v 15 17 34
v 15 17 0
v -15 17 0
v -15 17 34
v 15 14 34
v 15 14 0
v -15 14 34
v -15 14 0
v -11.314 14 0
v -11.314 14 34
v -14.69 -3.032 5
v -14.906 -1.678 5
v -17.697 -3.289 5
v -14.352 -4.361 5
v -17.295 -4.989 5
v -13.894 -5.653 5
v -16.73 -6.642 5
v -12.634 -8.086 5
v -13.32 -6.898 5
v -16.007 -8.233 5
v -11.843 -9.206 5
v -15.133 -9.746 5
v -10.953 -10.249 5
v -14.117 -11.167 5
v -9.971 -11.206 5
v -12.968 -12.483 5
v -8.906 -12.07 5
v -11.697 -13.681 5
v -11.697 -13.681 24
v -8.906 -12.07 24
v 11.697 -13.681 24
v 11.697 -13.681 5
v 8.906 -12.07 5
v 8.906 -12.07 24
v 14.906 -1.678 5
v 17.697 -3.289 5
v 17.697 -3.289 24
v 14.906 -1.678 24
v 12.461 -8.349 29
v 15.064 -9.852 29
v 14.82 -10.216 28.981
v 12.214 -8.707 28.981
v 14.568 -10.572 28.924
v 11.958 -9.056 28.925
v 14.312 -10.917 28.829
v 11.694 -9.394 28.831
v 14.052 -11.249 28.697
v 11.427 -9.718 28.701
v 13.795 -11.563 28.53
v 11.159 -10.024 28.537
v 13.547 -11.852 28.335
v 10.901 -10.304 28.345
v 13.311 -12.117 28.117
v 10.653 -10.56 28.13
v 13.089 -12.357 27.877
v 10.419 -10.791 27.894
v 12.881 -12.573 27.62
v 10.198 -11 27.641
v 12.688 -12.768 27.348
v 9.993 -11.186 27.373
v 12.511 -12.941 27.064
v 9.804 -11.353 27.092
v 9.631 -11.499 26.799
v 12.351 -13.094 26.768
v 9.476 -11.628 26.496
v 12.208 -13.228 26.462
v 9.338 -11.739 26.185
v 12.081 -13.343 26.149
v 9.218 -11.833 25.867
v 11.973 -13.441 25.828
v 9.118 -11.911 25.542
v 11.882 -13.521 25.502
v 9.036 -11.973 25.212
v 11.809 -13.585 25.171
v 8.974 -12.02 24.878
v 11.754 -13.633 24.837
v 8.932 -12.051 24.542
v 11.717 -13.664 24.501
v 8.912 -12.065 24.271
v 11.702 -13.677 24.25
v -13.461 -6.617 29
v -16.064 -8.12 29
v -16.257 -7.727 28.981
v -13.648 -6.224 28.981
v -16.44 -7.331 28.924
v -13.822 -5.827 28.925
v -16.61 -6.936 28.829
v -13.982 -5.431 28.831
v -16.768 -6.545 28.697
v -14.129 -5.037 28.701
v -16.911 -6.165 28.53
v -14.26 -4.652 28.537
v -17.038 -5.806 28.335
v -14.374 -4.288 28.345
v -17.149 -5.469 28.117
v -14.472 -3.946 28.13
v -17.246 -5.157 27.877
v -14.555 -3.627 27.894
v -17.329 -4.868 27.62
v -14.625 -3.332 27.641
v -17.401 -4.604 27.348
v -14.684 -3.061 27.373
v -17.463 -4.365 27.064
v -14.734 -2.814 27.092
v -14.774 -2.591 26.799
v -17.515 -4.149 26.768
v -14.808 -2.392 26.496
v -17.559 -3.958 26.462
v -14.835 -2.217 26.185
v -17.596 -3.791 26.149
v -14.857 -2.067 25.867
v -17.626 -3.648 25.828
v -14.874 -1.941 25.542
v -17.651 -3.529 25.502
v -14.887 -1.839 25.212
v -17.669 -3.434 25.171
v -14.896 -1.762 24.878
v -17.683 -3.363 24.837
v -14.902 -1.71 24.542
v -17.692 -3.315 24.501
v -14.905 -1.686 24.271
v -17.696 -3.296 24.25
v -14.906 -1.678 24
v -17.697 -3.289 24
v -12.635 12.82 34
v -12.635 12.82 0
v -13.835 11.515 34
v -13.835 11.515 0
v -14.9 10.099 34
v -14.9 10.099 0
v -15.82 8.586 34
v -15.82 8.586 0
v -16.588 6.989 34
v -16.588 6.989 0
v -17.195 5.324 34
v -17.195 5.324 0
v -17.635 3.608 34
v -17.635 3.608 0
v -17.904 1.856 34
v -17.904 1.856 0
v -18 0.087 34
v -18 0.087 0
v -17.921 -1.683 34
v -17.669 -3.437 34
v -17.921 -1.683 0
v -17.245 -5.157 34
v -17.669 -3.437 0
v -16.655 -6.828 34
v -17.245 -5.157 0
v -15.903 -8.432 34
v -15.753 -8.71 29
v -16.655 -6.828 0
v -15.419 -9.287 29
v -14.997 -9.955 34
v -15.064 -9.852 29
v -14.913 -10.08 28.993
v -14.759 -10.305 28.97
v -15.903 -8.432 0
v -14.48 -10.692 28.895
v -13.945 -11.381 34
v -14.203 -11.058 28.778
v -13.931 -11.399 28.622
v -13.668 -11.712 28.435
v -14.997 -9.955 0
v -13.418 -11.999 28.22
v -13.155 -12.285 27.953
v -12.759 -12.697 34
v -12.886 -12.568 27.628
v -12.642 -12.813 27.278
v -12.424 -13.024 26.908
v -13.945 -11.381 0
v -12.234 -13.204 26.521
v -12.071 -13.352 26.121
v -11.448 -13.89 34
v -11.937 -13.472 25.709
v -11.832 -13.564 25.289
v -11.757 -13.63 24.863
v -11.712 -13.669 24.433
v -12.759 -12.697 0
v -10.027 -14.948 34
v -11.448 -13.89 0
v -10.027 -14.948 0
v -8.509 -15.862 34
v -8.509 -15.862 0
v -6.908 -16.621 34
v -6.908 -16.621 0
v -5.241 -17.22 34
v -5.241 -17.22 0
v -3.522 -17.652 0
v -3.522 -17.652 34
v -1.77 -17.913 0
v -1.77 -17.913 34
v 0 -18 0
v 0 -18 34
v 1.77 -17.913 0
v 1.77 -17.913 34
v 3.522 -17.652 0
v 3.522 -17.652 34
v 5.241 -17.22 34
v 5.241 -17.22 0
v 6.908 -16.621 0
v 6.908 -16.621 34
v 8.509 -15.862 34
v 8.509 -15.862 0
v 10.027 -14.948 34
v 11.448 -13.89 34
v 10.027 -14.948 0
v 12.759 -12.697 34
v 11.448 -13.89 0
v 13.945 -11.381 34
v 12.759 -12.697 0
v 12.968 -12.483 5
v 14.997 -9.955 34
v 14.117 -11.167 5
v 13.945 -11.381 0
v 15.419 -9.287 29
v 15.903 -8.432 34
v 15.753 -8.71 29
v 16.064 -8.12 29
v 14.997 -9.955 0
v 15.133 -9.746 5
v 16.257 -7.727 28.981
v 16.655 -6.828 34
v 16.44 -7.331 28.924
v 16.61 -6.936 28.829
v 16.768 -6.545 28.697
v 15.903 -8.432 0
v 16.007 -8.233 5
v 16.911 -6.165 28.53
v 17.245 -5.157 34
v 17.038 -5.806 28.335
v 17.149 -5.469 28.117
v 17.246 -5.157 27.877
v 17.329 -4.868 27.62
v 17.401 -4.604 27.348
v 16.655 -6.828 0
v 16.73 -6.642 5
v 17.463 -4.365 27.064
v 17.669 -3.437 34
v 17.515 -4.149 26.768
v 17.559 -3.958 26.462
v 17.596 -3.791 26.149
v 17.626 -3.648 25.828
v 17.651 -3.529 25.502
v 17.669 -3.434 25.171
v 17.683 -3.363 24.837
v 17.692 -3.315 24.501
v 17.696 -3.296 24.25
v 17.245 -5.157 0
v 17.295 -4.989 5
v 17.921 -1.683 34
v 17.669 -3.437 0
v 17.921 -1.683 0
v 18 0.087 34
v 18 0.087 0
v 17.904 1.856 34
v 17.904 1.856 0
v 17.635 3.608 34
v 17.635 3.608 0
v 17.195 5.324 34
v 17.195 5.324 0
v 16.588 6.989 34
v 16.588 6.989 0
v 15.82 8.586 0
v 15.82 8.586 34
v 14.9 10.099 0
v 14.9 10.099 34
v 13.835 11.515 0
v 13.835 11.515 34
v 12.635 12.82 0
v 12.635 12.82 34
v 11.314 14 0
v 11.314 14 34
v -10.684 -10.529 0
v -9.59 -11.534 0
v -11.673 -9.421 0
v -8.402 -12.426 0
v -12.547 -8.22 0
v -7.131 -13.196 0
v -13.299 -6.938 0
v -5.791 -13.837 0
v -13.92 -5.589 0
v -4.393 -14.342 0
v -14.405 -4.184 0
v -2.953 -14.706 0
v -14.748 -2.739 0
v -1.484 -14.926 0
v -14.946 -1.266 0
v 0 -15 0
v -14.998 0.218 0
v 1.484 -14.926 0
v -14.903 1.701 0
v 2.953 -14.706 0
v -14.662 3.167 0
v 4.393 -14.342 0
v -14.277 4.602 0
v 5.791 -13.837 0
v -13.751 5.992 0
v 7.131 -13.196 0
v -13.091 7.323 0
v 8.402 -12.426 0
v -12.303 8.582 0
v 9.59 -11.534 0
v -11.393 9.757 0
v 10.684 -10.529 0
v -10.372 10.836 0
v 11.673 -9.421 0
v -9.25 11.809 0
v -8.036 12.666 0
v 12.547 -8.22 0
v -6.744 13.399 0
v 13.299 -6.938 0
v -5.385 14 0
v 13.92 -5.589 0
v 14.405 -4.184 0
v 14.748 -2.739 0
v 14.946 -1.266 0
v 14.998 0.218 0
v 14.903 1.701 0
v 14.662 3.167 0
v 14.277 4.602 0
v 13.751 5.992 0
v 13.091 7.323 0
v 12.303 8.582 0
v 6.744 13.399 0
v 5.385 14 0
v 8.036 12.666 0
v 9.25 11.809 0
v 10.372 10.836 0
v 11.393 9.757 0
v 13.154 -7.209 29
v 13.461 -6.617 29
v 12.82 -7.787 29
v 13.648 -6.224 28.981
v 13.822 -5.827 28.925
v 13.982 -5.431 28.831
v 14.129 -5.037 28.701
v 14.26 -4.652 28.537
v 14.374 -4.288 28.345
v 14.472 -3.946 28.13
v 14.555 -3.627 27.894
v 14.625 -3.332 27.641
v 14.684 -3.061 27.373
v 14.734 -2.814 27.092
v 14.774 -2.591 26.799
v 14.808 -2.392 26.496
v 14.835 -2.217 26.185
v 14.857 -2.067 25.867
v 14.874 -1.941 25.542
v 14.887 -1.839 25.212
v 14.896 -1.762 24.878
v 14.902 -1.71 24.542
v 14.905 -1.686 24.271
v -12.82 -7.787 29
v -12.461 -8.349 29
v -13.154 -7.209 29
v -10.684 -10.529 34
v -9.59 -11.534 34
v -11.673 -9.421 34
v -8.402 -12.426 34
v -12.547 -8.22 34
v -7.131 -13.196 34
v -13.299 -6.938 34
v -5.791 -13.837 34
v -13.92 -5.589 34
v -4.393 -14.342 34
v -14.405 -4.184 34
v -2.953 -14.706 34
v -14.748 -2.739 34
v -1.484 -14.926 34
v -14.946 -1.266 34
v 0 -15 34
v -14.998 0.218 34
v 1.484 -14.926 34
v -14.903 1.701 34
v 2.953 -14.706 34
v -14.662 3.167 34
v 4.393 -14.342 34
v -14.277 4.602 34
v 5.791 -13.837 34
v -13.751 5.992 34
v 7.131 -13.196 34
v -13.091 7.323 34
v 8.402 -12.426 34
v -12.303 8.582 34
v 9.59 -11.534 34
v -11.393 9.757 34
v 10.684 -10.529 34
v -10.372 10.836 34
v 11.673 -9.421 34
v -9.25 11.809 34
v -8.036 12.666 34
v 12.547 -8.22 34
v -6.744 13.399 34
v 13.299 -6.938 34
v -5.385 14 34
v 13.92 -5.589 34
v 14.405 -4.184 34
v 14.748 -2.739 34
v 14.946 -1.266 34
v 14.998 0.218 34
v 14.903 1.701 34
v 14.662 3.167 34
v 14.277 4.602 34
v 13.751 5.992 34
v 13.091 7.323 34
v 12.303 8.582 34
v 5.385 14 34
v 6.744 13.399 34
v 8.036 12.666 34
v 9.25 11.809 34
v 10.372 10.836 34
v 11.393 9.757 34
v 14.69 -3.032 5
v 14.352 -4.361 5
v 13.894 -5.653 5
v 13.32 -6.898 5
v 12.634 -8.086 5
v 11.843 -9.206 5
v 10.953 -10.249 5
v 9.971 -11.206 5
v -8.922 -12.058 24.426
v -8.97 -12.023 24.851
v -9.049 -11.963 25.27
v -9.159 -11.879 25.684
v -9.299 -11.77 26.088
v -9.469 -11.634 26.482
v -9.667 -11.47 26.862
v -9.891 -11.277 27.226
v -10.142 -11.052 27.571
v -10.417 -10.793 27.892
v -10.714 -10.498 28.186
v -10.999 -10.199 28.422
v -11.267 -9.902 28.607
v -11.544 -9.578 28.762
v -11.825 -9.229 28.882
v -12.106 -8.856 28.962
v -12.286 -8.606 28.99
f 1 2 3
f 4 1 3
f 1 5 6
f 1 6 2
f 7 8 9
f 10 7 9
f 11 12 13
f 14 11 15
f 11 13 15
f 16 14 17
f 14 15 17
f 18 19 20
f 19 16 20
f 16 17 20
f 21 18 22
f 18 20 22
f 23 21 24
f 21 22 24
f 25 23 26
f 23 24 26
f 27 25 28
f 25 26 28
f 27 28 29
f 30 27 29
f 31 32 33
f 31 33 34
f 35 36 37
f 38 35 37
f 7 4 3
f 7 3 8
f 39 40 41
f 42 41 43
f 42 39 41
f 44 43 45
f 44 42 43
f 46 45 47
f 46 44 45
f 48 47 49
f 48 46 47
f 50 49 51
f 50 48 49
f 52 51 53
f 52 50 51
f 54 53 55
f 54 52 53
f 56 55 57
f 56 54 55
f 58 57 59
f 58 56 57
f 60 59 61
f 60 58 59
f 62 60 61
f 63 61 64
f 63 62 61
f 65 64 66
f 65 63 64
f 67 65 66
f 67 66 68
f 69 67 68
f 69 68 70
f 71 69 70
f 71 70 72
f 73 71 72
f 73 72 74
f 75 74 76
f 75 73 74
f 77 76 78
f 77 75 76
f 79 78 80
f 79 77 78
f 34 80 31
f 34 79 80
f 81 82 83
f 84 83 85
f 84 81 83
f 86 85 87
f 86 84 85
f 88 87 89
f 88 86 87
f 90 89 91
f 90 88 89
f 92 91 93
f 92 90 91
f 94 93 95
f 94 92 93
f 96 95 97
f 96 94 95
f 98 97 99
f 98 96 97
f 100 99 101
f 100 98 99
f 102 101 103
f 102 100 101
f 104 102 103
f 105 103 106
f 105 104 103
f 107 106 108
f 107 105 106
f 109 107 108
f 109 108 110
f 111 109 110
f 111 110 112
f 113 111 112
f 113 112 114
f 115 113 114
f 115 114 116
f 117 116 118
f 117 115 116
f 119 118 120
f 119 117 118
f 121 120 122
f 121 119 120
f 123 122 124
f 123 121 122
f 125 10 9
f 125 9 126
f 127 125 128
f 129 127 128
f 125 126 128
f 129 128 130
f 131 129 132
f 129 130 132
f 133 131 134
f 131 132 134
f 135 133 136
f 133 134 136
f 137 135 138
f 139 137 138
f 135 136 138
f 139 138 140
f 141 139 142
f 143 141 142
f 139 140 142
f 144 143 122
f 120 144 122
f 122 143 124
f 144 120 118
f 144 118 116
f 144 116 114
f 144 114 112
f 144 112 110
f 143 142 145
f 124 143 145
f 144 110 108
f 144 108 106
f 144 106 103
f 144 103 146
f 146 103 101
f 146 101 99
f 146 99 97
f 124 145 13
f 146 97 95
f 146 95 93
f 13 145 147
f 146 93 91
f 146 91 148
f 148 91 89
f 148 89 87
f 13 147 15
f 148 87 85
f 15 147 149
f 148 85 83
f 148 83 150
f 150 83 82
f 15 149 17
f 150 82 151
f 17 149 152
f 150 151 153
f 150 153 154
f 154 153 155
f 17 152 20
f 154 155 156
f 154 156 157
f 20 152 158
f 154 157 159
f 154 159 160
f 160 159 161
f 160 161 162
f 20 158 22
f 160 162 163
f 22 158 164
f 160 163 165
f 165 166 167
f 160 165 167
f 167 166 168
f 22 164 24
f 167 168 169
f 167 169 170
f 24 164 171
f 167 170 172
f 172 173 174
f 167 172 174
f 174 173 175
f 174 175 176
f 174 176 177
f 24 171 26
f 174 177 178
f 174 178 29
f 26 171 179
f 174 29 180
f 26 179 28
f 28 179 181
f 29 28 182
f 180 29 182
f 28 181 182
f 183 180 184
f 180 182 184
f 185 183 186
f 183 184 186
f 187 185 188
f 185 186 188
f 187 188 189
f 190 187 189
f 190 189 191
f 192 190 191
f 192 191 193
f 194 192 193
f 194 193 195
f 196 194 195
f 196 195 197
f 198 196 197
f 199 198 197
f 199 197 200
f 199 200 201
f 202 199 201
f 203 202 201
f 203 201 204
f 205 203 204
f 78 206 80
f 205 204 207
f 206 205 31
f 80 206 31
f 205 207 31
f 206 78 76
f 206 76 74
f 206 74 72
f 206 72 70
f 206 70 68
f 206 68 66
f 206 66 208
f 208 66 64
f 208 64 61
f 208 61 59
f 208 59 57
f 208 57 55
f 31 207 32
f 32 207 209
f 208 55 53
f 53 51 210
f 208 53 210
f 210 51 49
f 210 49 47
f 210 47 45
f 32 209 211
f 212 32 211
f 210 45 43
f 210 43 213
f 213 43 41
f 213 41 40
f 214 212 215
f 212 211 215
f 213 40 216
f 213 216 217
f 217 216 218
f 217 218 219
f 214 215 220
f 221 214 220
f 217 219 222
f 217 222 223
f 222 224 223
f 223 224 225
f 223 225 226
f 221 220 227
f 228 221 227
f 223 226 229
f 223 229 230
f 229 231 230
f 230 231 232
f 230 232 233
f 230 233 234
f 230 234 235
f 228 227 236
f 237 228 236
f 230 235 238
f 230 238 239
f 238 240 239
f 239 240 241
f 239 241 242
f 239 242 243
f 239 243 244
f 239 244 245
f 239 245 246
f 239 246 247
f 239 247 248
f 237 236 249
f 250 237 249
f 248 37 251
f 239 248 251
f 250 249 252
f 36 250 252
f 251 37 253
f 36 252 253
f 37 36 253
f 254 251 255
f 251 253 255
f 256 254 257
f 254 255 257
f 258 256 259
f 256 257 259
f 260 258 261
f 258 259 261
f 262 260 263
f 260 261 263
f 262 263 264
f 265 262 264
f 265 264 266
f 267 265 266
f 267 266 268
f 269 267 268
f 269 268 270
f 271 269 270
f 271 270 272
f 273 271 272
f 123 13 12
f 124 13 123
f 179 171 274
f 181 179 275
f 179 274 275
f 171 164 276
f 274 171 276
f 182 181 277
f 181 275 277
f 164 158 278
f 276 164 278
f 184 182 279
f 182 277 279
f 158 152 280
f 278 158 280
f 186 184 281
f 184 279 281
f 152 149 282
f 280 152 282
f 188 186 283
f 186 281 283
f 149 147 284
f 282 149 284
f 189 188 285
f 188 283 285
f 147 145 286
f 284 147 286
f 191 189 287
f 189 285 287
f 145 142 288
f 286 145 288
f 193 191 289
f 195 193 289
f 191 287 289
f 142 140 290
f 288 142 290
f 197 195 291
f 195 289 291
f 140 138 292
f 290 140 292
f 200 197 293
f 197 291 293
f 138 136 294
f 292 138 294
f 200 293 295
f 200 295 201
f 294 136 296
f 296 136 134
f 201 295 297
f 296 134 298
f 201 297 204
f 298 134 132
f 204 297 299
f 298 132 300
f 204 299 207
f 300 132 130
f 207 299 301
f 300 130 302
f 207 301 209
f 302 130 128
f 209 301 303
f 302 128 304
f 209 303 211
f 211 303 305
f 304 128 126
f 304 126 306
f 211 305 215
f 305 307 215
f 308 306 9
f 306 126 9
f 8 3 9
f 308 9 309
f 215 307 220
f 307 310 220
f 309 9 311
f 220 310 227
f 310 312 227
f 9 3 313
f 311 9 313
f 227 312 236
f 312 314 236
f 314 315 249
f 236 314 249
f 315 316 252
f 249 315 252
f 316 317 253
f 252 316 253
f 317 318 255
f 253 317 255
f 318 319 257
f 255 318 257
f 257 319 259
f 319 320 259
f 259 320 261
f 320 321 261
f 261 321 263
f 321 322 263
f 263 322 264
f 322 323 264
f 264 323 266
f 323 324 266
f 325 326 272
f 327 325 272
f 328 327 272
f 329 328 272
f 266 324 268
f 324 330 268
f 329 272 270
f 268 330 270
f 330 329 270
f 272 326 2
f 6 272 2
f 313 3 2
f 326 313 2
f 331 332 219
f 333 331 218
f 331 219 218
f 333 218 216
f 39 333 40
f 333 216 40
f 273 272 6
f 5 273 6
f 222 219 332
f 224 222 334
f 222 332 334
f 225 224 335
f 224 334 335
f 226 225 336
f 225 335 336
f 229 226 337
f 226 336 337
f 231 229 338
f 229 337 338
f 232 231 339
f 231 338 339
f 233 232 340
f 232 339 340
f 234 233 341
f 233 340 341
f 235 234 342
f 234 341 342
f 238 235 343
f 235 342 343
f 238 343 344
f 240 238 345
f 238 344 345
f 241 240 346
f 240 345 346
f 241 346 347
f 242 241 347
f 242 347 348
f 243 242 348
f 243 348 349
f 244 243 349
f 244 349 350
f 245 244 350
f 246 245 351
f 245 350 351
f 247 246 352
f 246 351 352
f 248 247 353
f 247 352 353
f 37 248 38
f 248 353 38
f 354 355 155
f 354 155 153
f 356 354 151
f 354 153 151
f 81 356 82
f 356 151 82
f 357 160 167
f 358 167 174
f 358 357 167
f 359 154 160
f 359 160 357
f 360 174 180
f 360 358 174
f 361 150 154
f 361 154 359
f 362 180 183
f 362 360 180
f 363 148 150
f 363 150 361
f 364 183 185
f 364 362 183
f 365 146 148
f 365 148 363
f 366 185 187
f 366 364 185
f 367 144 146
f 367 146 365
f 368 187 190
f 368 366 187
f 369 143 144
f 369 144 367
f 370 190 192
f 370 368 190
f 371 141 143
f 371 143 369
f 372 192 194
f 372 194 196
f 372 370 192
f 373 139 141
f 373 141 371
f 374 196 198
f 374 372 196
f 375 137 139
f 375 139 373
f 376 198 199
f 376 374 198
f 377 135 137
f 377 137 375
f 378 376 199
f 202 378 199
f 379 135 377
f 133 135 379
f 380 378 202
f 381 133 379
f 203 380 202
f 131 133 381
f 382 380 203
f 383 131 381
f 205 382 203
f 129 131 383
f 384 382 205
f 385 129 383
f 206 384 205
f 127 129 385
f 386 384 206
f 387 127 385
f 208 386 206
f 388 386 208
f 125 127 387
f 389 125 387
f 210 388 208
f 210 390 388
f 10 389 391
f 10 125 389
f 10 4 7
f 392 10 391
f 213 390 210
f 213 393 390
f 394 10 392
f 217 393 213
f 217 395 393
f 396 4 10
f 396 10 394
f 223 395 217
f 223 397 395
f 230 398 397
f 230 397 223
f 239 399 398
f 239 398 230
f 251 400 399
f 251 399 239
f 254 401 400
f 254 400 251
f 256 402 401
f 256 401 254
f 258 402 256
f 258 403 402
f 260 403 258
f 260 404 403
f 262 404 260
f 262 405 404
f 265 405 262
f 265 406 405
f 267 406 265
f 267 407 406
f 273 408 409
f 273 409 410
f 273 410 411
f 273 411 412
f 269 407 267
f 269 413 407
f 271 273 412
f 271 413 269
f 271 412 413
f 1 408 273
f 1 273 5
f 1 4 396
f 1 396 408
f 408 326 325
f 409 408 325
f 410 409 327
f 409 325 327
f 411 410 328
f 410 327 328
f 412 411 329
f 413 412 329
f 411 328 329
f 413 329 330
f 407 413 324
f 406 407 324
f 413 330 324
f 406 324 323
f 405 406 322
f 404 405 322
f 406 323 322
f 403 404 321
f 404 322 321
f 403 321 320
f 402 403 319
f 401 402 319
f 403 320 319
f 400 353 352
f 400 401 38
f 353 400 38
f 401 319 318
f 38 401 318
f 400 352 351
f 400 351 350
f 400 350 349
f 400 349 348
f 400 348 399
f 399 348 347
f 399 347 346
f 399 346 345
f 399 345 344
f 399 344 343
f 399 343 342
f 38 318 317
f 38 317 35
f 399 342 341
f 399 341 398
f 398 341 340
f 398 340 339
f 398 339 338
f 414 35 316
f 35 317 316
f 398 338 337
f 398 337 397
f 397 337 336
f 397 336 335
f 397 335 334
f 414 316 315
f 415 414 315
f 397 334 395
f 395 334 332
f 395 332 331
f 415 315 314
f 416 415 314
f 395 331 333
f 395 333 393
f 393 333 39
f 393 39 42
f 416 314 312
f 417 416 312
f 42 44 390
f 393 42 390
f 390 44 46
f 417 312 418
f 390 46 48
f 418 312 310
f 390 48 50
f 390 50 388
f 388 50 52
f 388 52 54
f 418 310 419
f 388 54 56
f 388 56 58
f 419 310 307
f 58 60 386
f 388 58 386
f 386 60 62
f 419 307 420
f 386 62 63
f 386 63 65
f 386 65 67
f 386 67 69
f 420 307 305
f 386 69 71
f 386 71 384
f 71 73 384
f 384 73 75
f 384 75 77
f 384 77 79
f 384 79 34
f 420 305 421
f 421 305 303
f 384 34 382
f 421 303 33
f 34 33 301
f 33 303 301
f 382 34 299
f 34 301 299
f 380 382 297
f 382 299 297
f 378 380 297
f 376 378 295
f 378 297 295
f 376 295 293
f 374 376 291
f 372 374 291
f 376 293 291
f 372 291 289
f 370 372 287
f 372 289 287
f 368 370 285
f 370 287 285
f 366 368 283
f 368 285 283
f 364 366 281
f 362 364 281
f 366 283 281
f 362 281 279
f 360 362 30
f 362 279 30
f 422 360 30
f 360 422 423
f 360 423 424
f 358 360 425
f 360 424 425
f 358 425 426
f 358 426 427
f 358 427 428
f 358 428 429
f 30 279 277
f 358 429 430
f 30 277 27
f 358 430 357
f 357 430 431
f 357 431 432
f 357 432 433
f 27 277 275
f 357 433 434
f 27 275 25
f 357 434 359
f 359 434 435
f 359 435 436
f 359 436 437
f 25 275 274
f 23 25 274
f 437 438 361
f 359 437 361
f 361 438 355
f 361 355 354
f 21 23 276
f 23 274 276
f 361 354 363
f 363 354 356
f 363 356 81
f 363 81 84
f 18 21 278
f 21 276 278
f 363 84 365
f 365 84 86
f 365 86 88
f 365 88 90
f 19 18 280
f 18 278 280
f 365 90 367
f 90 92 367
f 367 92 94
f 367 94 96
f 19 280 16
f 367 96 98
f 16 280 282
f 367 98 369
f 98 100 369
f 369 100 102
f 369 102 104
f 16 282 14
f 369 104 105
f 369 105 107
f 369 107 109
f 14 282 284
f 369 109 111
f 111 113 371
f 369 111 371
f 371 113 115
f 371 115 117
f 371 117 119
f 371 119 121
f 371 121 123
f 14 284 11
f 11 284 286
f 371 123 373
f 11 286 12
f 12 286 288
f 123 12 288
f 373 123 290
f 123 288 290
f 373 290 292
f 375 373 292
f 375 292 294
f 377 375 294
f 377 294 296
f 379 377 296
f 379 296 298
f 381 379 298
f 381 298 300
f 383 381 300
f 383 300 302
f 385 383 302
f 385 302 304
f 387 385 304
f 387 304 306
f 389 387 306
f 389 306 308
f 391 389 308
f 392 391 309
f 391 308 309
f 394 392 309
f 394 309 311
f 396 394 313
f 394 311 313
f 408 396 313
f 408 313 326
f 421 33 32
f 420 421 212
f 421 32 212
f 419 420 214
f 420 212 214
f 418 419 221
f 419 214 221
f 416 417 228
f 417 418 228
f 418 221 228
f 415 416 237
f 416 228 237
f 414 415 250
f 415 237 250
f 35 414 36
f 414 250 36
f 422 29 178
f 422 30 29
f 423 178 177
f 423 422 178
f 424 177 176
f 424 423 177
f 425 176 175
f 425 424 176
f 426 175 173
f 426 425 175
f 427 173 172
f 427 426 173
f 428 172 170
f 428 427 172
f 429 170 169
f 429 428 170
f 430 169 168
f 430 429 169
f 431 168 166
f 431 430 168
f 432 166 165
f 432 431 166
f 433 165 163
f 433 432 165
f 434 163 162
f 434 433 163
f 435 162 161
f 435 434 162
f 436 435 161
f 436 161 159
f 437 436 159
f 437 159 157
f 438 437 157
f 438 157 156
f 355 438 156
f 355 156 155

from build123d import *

# Parameters (mm, degrees)
F1_DEPTH  = 34
F9_W      = 6
F9_H      = 24
F10_DEPTH = 10
F11_W     = 6
F11_H     = 24
F12_DEPTH = 10
F13_R     = 5


with BuildPart() as f1:
    # F0 (on Top) → F1 (new body)
    with BuildSketch(Plane.XY):
        with BuildLine():
            Line((-15, 14), (-11.313708, 14))
            ThreePointArc((-11.313708, 14), (0, -18), (11.313708, 14))
            Line((11.313708, 14), (15, 14))
            Line((15, 14), (15, 17))
            Line((15, 17), (-15, 17))
            Line((-15, 17), (-15, 14))
        make_face()
        with BuildLine():
            ThreePointArc((5.385165, 14), (0, -15), (-5.385165, 14))
            Line((-5.385165, 14), (5.385165, 14))
        make_face(mode=Mode.SUBTRACT)
    extrude(amount=F1_DEPTH)

    # F9 (on face) → F10 (cut)
    with BuildSketch(Plane(origin=(-15.588457, -9, 0), x_dir=(0.5, -0.866025, 0), z_dir=(-0.866025, -0.5, 0))):
        with Locations((-3, 17)):
            Rectangle(F9_W, F9_H)
        with Locations((3, 17)):
            Rectangle(F9_W, F9_H)
    extrude(amount=-F10_DEPTH, mode=Mode.SUBTRACT)

    # F11 (on face) → F12 (cut)
    with BuildSketch(Plane(origin=(15.588457, -9, 0), x_dir=(0.5, 0.866025, 0), z_dir=(0.866025, -0.5, 0))):
        with Locations((-3, 17)):
            Rectangle(F11_W, F11_H)
        with Locations((3, 17)):
            Rectangle(F11_W, F11_H)
    extrude(amount=-F12_DEPTH, mode=Mode.SUBTRACT)

    # F13
    f13_edges = [f1.edges().sort_by_distance(p)[0] for p in [
        (16.30141, -2.48342, 29),
        (10.30141, -12.875725, 29),
        (-16.30141, -2.48342, 29),
        (-10.30141, -12.875725, 29),
    ]]
    fillet(f13_edges, radius=F13_R)


solid = f1.part
